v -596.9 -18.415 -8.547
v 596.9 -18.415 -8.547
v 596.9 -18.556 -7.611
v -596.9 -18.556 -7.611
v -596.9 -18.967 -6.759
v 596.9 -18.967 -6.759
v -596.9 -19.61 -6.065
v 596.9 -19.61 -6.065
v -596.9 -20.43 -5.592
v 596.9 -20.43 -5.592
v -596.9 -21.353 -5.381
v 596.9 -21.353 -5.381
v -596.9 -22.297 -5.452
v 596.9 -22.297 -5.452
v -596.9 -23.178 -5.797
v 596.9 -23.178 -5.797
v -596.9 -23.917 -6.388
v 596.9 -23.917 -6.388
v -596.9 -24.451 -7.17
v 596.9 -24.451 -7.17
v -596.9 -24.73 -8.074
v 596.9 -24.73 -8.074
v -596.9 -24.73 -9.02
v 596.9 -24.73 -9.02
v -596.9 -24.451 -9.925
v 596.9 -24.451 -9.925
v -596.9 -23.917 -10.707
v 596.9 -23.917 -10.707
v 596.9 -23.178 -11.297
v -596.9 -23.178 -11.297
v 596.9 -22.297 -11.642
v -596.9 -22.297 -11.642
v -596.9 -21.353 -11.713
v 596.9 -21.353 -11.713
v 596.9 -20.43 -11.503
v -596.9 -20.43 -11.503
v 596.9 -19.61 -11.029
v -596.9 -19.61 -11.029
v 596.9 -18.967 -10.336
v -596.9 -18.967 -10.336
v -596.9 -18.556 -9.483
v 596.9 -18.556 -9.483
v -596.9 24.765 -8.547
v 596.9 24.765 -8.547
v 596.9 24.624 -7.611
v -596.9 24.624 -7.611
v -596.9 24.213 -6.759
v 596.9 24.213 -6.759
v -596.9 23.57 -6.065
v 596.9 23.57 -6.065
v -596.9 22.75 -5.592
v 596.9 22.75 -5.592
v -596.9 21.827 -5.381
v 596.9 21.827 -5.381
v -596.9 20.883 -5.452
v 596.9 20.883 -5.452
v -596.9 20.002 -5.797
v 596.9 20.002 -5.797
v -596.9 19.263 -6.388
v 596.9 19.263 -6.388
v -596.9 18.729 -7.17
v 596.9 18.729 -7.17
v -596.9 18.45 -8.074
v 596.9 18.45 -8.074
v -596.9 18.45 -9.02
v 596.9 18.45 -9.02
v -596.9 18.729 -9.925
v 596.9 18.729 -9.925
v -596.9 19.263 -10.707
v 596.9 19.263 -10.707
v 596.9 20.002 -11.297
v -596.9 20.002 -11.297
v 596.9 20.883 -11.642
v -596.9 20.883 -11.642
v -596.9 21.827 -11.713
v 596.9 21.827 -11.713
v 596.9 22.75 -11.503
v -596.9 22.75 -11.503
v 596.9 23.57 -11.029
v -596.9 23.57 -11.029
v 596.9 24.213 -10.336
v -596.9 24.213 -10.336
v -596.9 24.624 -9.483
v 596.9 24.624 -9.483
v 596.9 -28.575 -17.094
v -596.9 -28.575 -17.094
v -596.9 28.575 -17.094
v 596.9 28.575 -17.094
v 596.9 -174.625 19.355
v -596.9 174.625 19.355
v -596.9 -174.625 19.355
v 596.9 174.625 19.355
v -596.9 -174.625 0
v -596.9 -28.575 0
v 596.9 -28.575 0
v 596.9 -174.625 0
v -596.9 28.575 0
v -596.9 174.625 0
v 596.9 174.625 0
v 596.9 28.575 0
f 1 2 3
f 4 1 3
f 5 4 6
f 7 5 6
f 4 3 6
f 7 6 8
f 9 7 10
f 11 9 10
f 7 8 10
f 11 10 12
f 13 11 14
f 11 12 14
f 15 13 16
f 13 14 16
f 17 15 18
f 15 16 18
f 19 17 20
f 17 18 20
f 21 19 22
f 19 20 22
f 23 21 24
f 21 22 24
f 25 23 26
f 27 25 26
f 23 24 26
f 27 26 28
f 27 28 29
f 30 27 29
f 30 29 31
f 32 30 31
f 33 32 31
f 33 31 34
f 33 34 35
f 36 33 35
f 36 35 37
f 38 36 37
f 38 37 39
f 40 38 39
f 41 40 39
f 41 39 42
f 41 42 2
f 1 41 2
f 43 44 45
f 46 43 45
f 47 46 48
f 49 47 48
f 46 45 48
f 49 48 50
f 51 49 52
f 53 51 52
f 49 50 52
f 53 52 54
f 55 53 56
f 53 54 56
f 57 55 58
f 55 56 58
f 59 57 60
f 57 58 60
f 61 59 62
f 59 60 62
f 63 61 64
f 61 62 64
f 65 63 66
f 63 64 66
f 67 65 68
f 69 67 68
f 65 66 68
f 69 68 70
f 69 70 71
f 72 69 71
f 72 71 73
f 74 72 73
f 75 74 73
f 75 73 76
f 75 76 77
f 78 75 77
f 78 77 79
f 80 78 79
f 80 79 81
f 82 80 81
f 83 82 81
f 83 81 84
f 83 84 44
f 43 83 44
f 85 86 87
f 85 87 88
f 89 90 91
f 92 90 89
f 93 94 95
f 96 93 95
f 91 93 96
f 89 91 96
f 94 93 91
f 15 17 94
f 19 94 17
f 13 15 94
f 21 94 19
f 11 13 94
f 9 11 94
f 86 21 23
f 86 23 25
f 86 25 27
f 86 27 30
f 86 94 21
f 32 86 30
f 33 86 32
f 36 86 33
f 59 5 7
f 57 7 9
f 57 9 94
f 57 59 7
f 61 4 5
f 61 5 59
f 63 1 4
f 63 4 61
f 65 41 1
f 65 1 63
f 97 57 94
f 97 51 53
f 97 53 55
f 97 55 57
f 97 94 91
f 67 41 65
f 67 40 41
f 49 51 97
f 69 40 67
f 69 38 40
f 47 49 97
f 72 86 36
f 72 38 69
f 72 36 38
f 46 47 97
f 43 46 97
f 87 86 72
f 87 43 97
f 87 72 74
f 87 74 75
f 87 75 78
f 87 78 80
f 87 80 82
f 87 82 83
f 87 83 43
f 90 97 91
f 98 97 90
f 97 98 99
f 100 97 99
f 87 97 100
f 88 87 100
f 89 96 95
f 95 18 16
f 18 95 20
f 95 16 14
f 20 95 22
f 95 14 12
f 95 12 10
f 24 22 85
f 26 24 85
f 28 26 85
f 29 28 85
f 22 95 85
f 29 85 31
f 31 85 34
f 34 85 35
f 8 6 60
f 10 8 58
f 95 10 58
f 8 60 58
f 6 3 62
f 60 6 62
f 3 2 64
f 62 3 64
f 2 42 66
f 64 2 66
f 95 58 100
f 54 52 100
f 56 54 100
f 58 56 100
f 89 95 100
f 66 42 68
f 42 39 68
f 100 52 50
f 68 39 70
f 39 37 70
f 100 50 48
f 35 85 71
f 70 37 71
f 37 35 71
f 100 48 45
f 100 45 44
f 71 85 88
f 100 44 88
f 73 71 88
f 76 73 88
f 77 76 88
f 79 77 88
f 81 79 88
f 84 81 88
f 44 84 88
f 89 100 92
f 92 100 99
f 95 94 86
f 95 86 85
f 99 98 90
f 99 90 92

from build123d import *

# Parameters (mm, degrees)
F0_W     = 1193.8
F0_H     = 349.25
F1_DEPTH = 19.3548
F2_W     = 1193.8
F2_H     = 57.15
F3_DEPTH = 17.0942
F5_D     = 6.35


with BuildPart() as f1:
    # F0 (on Top) → F1 (new body)
    with BuildSketch(Plane.XY):
        Rectangle(F0_W, F0_H)
    extrude(amount=F1_DEPTH)

    # F2 (on face) → F3 (join)
    with BuildSketch(Plane(origin=(0, 0, 0), x_dir=(1, 0, 0), z_dir=(0, 0, -1))):
        Rectangle(F2_W, F2_H)
    extrude(amount=F3_DEPTH)

    # F5 (through all)
    with Locations(Plane(origin=(-596.9, 0, 0), x_dir=(0, -1, 0), z_dir=(-1, 0, 0))):
        with Locations((-21.59, -8.5471), (21.59, -8.5471)):
            Hole(F5_D / 2)


solid = f1.part
